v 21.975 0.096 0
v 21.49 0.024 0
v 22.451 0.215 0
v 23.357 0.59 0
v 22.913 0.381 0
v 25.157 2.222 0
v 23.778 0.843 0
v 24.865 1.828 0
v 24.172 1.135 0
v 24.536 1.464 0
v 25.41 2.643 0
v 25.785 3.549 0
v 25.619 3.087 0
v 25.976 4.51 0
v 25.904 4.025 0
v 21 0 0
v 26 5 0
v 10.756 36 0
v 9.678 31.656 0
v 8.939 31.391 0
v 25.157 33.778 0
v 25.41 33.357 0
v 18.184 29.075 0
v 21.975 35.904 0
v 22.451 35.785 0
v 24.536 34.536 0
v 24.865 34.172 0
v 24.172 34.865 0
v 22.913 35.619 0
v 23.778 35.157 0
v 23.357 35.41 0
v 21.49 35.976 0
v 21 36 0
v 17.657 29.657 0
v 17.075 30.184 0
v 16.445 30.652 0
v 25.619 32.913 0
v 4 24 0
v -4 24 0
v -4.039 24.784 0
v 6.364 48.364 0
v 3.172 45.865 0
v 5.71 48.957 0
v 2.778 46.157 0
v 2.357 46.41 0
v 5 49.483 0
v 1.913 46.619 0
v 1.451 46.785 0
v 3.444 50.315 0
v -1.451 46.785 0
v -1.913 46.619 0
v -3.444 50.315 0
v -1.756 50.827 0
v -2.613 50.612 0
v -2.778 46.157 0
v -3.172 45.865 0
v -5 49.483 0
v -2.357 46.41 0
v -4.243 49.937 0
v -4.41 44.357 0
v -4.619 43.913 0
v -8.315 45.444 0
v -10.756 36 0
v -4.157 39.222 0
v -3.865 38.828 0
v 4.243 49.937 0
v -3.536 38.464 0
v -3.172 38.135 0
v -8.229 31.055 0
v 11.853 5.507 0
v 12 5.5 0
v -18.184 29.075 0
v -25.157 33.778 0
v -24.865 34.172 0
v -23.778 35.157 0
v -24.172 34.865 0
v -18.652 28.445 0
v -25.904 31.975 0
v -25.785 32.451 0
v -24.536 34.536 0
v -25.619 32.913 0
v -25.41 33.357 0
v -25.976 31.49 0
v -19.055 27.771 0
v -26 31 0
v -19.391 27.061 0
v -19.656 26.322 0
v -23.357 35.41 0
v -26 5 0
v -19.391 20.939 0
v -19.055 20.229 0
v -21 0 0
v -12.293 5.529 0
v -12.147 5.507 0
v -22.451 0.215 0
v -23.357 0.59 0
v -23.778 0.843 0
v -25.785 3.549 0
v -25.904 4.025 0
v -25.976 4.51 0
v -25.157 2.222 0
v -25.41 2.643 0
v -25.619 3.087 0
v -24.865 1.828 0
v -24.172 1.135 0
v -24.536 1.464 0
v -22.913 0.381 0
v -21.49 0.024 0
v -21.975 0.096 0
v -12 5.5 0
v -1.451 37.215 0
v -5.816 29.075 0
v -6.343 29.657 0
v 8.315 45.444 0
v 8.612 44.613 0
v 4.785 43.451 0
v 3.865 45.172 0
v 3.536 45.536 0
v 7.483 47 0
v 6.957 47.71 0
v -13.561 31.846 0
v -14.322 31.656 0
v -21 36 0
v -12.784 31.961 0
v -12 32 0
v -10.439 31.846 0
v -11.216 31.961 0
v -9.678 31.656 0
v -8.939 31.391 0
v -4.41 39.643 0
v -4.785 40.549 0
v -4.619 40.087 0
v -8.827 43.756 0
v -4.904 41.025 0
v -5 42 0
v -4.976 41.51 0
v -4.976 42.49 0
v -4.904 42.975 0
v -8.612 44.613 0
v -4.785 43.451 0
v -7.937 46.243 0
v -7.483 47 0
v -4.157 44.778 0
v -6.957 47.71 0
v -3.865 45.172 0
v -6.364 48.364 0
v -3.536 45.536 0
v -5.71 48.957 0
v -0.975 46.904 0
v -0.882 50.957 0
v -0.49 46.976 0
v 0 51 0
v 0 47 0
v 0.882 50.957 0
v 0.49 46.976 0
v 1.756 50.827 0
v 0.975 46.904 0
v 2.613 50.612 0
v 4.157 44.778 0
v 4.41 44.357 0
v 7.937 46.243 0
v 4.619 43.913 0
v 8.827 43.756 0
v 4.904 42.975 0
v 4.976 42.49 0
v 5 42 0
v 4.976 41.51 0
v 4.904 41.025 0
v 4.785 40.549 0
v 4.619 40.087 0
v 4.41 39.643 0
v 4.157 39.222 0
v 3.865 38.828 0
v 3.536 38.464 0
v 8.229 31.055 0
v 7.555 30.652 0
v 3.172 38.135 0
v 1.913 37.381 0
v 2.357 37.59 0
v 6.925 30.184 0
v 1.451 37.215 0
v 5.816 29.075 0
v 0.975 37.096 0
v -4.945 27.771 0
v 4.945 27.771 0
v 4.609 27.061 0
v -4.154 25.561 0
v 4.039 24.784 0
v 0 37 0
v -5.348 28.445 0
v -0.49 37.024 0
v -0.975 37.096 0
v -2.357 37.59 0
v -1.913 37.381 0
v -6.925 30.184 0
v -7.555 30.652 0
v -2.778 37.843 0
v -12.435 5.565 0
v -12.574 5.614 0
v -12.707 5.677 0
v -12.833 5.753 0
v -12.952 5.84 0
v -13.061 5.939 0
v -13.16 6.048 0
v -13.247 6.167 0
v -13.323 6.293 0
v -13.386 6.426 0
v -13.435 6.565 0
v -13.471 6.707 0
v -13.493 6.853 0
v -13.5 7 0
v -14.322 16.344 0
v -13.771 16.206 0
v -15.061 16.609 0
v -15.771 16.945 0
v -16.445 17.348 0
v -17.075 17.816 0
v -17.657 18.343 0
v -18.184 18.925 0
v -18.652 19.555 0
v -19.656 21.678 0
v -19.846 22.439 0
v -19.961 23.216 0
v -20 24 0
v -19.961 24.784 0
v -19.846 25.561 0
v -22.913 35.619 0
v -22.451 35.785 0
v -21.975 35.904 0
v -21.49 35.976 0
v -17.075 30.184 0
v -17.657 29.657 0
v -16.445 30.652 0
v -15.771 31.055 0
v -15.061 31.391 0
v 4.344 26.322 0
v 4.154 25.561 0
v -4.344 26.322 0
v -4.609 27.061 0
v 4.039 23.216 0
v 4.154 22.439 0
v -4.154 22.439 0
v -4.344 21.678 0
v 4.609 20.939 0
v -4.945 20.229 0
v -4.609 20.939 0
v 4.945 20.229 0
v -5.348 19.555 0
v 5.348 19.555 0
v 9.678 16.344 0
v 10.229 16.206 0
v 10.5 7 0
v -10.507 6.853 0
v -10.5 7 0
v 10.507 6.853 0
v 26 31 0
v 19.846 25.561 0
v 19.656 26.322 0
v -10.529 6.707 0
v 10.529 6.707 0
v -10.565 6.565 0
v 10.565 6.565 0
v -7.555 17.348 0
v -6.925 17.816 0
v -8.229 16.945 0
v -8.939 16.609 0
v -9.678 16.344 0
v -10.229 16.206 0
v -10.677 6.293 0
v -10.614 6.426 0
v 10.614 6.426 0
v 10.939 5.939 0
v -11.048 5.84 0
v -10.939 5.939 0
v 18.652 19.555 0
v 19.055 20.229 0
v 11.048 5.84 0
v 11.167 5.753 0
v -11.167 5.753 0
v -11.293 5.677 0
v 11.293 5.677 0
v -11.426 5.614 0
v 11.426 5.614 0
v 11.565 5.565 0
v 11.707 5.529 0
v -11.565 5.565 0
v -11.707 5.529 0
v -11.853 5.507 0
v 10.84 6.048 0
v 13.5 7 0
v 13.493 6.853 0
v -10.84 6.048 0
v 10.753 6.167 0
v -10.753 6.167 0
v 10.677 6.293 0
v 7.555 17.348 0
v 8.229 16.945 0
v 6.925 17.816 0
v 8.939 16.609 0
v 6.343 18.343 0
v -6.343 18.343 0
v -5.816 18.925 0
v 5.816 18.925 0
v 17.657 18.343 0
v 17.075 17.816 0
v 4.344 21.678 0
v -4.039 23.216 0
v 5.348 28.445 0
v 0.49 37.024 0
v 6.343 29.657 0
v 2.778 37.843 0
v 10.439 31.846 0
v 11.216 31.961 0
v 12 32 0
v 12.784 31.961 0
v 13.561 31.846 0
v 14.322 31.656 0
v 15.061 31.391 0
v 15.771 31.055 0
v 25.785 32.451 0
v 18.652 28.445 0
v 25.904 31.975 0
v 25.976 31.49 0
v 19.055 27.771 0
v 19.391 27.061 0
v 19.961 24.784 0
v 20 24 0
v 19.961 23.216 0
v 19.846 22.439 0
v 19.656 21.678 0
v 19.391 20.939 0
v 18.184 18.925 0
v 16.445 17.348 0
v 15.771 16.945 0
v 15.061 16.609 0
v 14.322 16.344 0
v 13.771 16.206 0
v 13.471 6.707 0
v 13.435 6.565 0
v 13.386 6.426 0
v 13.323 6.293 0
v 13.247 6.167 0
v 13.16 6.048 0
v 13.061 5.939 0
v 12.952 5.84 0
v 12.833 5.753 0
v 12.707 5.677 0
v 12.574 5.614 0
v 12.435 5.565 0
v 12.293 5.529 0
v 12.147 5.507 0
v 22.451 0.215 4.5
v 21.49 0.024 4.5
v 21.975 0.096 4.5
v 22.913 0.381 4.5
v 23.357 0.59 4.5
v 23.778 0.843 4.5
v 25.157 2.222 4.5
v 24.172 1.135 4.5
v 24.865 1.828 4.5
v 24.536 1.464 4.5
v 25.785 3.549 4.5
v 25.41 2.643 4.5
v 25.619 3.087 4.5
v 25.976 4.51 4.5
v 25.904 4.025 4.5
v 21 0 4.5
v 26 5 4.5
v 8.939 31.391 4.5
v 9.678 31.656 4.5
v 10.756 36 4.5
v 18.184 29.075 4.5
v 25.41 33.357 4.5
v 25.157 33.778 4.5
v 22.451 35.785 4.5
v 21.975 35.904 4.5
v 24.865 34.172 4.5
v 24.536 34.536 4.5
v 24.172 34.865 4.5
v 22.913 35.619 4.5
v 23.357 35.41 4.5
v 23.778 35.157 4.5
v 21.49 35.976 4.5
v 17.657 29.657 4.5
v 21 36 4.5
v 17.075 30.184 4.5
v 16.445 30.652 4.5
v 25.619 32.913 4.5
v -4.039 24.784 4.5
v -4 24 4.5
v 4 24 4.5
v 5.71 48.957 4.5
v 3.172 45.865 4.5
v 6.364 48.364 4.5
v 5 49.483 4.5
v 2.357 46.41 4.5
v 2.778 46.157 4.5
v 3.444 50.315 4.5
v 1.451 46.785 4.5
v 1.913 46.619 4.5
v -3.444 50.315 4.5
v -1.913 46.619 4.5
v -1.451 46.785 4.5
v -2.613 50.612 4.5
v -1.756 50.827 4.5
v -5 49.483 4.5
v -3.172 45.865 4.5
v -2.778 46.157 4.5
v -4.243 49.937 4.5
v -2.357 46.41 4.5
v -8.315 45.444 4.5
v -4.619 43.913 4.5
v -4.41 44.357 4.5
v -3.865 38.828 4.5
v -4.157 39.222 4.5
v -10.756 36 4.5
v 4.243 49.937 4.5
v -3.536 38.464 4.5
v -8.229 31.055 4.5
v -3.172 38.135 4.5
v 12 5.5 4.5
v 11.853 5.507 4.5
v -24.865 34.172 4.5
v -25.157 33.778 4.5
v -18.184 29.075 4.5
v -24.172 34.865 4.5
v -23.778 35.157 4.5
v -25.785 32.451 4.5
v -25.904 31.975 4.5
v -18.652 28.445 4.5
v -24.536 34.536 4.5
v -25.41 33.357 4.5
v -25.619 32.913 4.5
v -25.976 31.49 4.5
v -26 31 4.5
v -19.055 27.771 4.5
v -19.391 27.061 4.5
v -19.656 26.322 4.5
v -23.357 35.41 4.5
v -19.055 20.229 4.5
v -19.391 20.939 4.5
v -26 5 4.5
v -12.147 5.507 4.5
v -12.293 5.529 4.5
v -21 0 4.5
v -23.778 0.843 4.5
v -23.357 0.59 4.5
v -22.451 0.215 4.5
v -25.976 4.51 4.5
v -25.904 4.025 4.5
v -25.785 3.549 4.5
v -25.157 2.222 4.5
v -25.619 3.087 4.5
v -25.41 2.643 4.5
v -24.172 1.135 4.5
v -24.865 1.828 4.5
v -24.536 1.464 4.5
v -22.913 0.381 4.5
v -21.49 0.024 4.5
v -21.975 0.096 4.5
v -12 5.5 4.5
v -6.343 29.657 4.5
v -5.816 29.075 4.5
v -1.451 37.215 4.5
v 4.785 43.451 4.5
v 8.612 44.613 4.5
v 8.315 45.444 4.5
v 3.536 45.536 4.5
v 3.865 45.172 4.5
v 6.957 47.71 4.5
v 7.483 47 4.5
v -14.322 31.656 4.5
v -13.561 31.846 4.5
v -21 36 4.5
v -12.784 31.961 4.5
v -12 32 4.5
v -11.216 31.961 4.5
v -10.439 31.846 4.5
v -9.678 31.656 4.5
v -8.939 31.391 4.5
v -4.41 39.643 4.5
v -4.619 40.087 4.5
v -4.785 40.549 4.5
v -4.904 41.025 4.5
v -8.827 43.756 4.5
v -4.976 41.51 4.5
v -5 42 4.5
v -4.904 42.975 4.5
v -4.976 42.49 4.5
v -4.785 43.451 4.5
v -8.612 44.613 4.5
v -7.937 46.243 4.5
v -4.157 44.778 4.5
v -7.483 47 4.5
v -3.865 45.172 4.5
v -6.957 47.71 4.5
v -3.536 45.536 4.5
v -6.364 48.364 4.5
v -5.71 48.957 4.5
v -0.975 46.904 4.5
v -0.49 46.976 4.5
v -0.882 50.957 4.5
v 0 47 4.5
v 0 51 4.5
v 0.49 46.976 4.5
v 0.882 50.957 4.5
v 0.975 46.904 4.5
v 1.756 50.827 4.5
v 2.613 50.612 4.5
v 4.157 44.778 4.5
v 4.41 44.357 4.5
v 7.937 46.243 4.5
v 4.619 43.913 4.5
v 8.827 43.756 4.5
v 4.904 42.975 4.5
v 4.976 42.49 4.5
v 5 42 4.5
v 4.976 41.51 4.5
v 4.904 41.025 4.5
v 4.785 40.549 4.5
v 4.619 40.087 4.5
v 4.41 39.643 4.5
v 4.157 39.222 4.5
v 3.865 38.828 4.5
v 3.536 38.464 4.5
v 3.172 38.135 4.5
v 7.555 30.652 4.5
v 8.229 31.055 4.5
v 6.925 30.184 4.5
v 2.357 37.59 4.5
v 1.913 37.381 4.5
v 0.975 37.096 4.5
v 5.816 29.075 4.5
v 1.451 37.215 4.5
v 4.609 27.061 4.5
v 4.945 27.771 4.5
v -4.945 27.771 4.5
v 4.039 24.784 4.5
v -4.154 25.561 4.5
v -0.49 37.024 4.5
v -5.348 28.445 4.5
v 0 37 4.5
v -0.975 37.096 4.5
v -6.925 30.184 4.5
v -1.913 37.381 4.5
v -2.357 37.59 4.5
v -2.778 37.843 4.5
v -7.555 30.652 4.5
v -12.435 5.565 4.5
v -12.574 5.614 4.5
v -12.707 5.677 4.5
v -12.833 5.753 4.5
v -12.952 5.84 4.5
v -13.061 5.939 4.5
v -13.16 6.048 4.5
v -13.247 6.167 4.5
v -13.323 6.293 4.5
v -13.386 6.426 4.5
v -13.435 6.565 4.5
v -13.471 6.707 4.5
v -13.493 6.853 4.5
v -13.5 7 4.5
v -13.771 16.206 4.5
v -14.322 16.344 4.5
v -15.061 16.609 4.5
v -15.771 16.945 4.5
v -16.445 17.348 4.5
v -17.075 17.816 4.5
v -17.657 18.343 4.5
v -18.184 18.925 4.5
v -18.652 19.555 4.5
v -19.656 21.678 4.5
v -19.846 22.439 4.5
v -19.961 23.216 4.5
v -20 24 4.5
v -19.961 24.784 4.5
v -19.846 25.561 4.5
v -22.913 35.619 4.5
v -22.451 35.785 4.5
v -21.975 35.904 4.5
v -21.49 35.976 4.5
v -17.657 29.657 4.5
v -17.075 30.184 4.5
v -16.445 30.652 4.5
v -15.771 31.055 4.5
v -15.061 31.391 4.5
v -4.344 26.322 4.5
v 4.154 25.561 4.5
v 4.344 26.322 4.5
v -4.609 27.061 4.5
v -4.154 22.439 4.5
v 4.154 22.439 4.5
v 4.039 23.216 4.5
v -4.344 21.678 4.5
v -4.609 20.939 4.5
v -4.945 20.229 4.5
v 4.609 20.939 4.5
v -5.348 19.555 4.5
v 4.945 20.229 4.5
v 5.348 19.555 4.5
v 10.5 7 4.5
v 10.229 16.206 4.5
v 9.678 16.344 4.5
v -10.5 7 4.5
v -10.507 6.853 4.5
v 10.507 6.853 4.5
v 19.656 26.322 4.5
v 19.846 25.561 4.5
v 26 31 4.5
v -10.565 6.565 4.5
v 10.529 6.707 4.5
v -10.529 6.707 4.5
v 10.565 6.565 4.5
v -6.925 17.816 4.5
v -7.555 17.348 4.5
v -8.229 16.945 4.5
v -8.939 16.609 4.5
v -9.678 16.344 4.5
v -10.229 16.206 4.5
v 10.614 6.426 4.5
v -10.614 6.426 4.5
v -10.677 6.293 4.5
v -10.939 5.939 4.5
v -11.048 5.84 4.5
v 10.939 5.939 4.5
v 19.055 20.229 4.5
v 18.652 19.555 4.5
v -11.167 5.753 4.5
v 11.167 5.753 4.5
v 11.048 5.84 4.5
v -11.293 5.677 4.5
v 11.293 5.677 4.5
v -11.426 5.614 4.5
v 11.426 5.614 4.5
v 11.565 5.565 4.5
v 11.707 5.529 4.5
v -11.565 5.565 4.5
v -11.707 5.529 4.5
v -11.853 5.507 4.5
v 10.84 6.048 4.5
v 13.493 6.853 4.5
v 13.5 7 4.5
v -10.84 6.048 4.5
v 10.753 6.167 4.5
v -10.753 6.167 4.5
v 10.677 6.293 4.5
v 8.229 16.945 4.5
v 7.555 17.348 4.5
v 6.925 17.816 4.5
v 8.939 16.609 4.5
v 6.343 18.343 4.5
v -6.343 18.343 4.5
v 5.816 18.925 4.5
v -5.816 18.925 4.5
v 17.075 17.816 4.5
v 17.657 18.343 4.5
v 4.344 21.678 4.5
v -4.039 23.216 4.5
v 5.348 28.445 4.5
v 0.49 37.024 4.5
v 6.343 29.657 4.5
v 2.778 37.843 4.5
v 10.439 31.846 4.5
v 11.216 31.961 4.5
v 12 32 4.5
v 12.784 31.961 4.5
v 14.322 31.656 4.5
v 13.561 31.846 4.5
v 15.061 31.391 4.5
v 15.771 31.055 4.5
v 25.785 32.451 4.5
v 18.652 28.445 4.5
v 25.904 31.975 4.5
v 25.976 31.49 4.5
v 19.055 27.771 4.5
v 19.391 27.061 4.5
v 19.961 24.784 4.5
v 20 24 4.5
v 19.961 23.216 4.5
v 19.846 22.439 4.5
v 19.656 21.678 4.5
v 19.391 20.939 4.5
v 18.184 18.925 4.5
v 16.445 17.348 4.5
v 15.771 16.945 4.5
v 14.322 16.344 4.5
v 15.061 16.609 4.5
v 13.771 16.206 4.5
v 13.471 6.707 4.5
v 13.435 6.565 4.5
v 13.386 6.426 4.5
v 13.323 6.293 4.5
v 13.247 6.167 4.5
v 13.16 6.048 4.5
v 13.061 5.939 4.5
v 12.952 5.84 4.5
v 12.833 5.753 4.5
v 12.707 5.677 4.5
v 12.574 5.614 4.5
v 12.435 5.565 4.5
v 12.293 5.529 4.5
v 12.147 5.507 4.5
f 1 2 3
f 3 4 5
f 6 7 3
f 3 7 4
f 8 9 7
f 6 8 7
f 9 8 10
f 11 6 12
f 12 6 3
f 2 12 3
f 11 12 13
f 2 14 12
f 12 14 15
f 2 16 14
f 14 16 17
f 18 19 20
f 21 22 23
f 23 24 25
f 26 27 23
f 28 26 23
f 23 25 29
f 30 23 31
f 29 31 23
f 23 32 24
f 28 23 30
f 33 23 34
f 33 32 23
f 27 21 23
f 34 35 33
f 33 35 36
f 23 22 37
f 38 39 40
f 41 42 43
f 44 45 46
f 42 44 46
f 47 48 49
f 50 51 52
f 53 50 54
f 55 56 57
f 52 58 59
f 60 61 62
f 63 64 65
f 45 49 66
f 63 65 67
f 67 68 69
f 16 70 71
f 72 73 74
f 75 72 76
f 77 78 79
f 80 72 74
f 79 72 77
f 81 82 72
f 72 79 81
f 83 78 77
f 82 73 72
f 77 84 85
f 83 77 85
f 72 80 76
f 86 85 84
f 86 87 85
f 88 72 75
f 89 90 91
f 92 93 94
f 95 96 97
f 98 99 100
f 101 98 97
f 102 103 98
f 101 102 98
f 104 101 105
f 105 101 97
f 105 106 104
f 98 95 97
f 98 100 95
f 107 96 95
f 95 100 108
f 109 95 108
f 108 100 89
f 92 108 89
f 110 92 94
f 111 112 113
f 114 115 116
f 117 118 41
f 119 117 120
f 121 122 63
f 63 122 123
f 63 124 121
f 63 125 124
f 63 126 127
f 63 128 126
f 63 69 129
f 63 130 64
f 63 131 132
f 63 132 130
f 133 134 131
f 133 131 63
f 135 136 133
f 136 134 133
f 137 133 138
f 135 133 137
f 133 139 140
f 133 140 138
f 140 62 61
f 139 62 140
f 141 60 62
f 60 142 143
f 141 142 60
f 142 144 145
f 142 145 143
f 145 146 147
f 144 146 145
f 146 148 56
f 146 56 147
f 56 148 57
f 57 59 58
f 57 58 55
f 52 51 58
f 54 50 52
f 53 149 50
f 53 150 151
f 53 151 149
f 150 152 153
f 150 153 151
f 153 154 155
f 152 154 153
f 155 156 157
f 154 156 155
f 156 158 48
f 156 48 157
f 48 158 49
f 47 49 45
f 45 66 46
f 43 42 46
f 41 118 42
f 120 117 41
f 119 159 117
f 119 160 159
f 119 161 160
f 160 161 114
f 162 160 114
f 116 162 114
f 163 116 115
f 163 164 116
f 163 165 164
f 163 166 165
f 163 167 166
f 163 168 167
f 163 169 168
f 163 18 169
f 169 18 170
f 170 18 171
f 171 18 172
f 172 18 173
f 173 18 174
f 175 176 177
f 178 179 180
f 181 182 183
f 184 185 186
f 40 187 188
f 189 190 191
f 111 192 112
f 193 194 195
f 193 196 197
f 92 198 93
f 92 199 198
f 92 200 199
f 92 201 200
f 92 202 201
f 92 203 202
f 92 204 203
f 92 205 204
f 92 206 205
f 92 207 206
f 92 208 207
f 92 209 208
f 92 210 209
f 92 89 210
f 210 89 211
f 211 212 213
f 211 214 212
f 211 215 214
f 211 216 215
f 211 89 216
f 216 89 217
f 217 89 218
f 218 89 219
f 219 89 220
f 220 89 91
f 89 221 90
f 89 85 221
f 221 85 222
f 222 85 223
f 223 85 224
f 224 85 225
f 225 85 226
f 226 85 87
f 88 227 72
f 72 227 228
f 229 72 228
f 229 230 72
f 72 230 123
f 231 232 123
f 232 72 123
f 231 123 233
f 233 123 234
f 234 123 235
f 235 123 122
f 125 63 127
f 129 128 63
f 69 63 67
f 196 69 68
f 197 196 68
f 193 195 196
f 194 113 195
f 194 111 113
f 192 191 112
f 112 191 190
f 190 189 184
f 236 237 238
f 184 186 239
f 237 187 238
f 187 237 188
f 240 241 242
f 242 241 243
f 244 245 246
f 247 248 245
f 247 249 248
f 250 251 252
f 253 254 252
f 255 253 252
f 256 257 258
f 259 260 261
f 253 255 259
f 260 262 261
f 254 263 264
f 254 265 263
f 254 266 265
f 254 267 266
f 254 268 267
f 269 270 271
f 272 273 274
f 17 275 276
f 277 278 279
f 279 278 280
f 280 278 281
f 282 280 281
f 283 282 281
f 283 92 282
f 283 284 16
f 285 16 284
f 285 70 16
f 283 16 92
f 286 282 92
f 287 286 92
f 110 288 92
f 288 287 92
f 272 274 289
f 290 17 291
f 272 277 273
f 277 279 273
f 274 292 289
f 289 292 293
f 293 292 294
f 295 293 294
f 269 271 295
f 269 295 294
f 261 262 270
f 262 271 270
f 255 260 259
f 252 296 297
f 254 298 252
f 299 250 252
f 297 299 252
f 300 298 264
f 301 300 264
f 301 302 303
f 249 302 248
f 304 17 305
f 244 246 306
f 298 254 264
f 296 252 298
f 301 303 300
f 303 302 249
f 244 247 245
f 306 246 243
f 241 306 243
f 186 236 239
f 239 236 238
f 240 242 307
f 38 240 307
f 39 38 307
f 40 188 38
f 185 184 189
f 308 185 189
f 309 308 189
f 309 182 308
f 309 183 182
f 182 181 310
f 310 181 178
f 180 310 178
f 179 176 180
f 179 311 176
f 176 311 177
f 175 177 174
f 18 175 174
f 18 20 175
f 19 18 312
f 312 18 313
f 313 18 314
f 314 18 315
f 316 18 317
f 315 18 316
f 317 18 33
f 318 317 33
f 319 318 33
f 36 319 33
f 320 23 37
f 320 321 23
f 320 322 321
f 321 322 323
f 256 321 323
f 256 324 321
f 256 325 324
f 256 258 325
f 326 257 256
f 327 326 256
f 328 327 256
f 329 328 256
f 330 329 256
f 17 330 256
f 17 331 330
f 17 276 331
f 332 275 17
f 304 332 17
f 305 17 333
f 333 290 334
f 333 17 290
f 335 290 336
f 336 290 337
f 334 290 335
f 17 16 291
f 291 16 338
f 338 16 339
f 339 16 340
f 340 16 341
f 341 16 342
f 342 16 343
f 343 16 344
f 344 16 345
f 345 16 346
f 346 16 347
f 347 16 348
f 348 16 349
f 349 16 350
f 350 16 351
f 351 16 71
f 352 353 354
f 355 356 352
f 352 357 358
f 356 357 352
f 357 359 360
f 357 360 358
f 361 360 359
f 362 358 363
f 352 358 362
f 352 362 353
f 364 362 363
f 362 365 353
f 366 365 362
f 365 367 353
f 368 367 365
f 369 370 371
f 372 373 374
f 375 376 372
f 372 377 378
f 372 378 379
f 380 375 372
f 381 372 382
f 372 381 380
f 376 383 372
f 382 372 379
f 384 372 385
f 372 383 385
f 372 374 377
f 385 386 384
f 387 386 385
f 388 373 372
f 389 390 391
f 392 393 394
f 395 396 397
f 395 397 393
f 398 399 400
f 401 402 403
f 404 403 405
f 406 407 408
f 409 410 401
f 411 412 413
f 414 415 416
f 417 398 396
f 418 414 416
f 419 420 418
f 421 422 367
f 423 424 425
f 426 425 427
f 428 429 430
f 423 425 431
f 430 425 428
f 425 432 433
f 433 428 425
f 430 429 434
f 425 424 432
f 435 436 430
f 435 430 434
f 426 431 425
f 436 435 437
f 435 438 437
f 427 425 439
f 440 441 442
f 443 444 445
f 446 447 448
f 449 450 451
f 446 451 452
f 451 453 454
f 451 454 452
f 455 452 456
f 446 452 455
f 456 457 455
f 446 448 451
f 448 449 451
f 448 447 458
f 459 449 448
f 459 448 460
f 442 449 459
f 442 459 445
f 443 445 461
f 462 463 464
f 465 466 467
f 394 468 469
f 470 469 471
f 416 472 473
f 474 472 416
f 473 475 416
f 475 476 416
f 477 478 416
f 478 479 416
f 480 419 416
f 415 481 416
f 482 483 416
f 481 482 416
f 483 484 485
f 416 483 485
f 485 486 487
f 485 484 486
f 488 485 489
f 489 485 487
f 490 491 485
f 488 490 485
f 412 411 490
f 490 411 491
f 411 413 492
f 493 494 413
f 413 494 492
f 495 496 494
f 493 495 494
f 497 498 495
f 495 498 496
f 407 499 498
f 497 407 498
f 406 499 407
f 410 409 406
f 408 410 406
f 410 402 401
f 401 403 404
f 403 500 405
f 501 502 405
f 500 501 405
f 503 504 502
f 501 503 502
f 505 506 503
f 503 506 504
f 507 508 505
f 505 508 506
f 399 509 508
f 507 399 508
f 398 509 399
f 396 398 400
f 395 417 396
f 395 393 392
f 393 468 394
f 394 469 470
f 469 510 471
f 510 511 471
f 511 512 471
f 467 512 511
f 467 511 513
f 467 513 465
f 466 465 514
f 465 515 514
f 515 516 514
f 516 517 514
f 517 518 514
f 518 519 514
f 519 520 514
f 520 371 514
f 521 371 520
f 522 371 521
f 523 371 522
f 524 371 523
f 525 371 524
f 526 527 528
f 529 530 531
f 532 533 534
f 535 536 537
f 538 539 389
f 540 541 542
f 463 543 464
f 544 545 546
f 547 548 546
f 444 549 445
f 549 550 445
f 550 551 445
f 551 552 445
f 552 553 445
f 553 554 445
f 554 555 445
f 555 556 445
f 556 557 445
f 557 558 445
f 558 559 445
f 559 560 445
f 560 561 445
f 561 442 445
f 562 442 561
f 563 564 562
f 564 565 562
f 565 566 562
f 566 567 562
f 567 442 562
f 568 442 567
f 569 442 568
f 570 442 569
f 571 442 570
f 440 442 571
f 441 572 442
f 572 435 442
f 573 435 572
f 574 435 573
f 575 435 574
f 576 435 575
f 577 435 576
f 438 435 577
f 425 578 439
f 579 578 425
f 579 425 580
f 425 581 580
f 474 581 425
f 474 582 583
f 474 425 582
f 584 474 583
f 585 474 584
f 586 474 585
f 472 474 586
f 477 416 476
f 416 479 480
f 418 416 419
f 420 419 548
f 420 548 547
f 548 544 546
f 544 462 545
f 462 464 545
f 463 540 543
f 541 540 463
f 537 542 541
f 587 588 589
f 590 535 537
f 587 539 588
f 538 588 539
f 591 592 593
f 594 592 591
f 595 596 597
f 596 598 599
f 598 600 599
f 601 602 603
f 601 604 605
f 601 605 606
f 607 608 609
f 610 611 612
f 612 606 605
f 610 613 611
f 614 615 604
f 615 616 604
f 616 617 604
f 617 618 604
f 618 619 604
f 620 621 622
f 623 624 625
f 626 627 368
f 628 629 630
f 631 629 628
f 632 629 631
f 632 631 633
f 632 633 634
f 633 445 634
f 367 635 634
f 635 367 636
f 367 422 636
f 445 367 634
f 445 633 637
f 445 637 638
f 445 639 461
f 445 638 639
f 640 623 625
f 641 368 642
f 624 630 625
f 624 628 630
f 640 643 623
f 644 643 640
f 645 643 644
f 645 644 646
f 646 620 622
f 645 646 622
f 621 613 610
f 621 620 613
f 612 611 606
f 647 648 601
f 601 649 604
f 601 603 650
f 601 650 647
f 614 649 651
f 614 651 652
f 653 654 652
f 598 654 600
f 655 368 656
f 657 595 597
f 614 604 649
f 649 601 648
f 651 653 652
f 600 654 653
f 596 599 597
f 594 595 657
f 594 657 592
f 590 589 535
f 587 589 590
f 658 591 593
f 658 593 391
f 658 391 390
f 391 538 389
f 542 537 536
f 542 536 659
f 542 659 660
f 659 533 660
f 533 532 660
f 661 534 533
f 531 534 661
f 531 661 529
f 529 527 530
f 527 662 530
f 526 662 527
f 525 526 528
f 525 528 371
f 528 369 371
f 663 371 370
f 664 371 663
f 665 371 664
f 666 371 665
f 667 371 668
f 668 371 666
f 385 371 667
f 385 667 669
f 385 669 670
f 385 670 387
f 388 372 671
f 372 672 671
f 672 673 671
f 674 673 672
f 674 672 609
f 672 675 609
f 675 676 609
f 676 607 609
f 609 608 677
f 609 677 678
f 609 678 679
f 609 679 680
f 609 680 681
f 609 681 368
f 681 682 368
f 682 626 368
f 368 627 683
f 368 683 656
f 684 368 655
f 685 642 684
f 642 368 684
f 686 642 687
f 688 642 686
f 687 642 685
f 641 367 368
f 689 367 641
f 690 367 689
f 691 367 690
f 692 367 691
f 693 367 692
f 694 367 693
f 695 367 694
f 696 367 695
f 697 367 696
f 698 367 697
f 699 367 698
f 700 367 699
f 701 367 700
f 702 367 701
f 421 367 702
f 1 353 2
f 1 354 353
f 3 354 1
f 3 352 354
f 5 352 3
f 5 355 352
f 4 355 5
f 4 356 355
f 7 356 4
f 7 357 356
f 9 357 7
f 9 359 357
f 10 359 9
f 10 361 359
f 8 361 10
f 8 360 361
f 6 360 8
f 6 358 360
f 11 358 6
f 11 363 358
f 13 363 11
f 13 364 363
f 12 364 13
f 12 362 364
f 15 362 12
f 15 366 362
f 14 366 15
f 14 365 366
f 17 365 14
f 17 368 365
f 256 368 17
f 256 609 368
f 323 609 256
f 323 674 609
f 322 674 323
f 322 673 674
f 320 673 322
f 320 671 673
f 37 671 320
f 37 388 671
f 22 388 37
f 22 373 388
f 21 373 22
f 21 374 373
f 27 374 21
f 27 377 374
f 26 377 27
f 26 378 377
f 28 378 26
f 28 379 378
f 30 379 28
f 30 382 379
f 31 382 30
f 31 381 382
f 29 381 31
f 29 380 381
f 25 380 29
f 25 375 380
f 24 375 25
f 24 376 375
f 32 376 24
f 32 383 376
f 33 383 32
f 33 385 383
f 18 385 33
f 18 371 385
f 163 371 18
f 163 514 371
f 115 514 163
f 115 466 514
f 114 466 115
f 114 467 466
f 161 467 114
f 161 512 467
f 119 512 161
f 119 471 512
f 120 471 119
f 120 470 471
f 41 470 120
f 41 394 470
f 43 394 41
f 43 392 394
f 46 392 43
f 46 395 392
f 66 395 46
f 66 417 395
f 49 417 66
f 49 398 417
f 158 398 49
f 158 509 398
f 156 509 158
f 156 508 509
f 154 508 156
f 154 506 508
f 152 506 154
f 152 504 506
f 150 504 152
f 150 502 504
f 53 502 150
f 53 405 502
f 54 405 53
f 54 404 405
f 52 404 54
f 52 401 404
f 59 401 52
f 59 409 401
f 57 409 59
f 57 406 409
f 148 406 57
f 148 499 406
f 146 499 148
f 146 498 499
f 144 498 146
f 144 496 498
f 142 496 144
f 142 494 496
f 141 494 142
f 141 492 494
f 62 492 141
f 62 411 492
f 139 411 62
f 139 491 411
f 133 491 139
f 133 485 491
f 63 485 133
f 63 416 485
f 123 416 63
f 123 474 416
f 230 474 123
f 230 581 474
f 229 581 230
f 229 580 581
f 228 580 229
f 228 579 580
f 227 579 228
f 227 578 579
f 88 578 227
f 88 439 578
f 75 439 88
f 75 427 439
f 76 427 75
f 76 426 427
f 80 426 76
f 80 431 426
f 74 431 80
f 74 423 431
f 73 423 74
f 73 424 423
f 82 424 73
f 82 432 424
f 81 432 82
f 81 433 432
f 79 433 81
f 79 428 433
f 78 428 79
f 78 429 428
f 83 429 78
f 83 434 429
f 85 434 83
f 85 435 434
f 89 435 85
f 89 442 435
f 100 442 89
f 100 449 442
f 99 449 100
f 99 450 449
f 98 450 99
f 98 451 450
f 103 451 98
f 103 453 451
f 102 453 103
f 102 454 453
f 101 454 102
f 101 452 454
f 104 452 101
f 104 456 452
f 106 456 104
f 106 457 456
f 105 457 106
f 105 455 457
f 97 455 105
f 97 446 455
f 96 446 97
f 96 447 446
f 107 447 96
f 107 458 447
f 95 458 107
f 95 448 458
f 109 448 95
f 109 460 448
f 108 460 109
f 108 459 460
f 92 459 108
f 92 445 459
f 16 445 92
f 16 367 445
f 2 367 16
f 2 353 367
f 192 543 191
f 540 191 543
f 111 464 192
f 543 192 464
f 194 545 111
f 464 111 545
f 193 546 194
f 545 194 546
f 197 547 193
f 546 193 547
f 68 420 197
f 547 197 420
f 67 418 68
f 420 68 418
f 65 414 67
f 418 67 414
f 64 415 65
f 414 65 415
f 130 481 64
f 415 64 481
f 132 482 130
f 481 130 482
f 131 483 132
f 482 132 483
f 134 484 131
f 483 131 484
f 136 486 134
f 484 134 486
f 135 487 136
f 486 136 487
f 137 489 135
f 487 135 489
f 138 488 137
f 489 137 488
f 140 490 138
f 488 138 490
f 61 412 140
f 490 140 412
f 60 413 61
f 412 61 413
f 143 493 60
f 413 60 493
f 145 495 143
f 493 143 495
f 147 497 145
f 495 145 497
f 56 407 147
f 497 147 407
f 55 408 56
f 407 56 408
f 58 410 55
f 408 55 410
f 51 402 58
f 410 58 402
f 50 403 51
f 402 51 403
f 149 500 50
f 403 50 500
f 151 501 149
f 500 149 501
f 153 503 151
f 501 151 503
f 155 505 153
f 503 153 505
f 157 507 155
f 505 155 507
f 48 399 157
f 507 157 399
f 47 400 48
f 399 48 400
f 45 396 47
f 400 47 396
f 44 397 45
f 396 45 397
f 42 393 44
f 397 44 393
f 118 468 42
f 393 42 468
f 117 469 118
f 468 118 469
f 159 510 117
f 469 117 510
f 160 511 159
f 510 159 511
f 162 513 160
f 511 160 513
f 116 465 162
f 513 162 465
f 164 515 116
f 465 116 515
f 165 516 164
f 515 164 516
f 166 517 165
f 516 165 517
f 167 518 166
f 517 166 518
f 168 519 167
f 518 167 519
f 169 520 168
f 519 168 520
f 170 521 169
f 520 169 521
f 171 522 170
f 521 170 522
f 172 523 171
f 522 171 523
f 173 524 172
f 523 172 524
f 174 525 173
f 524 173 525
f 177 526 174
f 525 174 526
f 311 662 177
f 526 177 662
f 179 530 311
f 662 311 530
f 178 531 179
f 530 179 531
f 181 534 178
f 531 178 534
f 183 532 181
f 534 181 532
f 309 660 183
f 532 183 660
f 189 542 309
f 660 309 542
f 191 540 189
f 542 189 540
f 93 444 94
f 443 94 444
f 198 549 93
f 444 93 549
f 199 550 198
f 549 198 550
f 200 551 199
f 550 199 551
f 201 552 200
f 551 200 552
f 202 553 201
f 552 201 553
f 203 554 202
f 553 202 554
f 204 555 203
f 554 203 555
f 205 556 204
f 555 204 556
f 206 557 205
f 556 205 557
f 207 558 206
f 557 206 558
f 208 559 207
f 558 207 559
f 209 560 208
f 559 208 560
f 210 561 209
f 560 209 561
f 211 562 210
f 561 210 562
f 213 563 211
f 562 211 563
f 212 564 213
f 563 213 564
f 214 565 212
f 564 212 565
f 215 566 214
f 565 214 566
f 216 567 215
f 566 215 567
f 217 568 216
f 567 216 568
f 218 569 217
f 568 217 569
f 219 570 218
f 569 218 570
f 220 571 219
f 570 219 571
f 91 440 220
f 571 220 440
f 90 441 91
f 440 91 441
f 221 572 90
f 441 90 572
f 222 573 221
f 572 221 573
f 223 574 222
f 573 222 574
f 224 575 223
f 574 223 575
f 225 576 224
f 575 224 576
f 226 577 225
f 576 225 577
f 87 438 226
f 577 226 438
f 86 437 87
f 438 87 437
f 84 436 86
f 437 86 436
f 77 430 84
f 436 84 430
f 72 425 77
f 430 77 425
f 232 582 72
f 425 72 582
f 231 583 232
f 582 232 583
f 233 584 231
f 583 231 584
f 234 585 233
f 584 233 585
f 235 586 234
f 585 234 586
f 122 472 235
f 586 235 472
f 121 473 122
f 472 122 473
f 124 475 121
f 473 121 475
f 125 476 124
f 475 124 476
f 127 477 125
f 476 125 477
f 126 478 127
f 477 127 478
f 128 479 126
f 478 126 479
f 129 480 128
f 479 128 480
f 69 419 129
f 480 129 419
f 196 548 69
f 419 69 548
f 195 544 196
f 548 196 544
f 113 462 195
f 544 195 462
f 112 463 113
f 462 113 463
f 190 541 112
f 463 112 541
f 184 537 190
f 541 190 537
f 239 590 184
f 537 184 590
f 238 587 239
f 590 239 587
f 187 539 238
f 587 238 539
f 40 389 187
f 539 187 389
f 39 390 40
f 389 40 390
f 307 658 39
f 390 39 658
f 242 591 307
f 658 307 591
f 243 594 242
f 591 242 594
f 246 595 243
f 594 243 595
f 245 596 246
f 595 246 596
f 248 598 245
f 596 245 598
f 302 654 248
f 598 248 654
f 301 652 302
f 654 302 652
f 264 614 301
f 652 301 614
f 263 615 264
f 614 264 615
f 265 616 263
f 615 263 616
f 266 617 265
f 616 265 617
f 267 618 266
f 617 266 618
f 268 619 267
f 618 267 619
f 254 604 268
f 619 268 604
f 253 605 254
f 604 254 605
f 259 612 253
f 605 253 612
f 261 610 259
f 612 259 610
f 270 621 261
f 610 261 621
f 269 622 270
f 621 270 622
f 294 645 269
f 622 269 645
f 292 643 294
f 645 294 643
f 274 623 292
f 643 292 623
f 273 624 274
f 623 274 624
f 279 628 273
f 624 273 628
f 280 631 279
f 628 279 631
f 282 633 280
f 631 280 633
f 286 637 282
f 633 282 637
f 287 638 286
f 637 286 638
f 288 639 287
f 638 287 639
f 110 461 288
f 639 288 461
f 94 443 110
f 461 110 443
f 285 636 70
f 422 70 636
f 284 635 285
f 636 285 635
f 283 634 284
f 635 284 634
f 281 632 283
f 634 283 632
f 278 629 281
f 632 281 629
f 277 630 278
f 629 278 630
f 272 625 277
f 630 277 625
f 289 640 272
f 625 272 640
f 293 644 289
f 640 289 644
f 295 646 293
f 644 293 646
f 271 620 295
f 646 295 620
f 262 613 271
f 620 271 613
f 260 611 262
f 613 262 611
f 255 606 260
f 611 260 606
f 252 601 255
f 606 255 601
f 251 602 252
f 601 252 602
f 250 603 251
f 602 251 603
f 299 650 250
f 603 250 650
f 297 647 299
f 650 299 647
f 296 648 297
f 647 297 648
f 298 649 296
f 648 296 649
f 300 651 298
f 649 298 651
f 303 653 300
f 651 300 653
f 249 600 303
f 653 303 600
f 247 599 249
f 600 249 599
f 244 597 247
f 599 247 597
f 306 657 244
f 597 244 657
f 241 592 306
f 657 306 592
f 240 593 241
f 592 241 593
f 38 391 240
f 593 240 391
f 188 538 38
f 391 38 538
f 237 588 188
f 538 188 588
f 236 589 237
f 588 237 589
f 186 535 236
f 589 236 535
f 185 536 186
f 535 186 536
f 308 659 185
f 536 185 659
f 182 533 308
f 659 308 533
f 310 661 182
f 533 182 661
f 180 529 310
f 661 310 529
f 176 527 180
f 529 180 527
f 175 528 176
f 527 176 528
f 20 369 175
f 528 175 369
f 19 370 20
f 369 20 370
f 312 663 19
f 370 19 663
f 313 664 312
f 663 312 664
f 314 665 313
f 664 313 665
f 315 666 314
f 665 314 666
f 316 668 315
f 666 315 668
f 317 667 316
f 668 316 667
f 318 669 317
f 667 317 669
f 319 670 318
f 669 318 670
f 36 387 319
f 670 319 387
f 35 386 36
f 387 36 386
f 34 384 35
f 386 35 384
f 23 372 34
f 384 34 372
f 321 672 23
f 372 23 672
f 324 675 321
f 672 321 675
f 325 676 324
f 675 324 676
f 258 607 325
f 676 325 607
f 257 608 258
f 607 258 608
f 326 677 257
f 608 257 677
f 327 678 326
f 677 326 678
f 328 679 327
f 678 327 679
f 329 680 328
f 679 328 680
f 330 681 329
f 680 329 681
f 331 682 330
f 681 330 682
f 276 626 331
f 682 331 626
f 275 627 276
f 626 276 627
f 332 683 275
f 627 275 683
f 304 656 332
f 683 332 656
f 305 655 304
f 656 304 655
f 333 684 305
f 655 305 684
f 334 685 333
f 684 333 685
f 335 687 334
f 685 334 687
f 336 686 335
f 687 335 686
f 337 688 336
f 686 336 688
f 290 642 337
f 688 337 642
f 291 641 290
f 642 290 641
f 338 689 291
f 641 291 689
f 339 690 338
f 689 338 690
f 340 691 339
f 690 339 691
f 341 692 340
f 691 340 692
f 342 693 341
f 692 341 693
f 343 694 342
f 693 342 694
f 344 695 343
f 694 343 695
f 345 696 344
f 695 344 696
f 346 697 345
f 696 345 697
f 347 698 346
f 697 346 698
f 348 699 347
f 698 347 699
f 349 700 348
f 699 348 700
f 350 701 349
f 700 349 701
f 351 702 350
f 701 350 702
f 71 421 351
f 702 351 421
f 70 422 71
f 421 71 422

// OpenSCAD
// v2 (2026-11-08): no snap gate; round hole for the belt's metal clip. v1 below kept as part="v1".
// Used-poop-bag clip. Hooks onto a belt (<=40 mm), belt buckle, leash or D-ring
// through a snap gate; two keyholes hold tied bags (push knot through the
// round hole, slide the neck down the slot). Prints flat, no supports.
t = 4.5;          // thickness
W = 52;           // overall width
plate_h = 36;
key_d = 16;       // knot hole
slot_w = 4;       // bag-neck slot (tapers to slot_w - 1)
// hook loop
in_w = 42; in_h = 10; wall = 5;
gap_lo = 41; gap_hi = 47;   // opening in the right wall
gate_r = 0.7;               // gate is 1.4 mm thick
$fn = 64;

module rrect(x0, y0, x1, y1, r) {
  translate([x0 + r, y0 + r]) offset(r) square([x1 - x0 - 2 * r, y1 - y0 - 2 * r]);
}

loop_y0 = plate_h - 2;
in_y0 = loop_y0 + wall;           // 39
in_y1 = in_y0 + in_h;             // 49

module clip2d() {
  difference() {
    union() {
      rrect(-W / 2, 0, W / 2, plate_h, 5);
      rrect(-W / 2, loop_y0, W / 2, in_y1 + wall, 5);
    }
    // loop opening
    rrect(-in_w / 2, in_y0, in_w / 2, in_y1, 0.5);
    // entry gap in right wall
    translate([in_w / 2 - 1, gap_lo]) square([wall + 2, gap_hi - gap_lo]);
    // keyholes
    for (x = [-12, 12]) {
      translate([x, 24]) circle(d = key_d);
      hull() {
        translate([x, 24]) circle(d = slot_w);
        translate([x, 7]) circle(d = slot_w - 1);
      }
    }
  }
  // snap gate: rooted in the lower stub, tip rests just inside the upper stub
  hull() {
    translate([in_w / 2 + 3, in_y0 + 1]) circle(gate_r);
    translate([in_w / 2 - 1.4, gap_hi + 0.9]) circle(gate_r);
  }
}

part = "v2";

module clip2d_v2() {
  hole_d = 10;  ring_w = 4;  ry = plate_h + hole_d / 2 + 1;
  difference() {
    union() {
      rrect(-W / 2, 0, W / 2, plate_h, 5);
      hull() {                                  // tab with the clip hole
        translate([0, ry]) circle(d = hole_d + 2 * ring_w);
        translate([-12, plate_h - 6]) square([24, 1]);
      }
    }
    translate([0, ry]) circle(d = hole_d);
    for (x = [-12, 12]) {
      translate([x, 24]) circle(d = key_d);
      hull() {
        translate([x, 24]) circle(d = slot_w);
        translate([x, 7]) circle(d = slot_w - 1);
      }
    }
  }
}

if (part == "v1") linear_extrude(t) clip2d(); else linear_extrude(t) clip2d_v2();
